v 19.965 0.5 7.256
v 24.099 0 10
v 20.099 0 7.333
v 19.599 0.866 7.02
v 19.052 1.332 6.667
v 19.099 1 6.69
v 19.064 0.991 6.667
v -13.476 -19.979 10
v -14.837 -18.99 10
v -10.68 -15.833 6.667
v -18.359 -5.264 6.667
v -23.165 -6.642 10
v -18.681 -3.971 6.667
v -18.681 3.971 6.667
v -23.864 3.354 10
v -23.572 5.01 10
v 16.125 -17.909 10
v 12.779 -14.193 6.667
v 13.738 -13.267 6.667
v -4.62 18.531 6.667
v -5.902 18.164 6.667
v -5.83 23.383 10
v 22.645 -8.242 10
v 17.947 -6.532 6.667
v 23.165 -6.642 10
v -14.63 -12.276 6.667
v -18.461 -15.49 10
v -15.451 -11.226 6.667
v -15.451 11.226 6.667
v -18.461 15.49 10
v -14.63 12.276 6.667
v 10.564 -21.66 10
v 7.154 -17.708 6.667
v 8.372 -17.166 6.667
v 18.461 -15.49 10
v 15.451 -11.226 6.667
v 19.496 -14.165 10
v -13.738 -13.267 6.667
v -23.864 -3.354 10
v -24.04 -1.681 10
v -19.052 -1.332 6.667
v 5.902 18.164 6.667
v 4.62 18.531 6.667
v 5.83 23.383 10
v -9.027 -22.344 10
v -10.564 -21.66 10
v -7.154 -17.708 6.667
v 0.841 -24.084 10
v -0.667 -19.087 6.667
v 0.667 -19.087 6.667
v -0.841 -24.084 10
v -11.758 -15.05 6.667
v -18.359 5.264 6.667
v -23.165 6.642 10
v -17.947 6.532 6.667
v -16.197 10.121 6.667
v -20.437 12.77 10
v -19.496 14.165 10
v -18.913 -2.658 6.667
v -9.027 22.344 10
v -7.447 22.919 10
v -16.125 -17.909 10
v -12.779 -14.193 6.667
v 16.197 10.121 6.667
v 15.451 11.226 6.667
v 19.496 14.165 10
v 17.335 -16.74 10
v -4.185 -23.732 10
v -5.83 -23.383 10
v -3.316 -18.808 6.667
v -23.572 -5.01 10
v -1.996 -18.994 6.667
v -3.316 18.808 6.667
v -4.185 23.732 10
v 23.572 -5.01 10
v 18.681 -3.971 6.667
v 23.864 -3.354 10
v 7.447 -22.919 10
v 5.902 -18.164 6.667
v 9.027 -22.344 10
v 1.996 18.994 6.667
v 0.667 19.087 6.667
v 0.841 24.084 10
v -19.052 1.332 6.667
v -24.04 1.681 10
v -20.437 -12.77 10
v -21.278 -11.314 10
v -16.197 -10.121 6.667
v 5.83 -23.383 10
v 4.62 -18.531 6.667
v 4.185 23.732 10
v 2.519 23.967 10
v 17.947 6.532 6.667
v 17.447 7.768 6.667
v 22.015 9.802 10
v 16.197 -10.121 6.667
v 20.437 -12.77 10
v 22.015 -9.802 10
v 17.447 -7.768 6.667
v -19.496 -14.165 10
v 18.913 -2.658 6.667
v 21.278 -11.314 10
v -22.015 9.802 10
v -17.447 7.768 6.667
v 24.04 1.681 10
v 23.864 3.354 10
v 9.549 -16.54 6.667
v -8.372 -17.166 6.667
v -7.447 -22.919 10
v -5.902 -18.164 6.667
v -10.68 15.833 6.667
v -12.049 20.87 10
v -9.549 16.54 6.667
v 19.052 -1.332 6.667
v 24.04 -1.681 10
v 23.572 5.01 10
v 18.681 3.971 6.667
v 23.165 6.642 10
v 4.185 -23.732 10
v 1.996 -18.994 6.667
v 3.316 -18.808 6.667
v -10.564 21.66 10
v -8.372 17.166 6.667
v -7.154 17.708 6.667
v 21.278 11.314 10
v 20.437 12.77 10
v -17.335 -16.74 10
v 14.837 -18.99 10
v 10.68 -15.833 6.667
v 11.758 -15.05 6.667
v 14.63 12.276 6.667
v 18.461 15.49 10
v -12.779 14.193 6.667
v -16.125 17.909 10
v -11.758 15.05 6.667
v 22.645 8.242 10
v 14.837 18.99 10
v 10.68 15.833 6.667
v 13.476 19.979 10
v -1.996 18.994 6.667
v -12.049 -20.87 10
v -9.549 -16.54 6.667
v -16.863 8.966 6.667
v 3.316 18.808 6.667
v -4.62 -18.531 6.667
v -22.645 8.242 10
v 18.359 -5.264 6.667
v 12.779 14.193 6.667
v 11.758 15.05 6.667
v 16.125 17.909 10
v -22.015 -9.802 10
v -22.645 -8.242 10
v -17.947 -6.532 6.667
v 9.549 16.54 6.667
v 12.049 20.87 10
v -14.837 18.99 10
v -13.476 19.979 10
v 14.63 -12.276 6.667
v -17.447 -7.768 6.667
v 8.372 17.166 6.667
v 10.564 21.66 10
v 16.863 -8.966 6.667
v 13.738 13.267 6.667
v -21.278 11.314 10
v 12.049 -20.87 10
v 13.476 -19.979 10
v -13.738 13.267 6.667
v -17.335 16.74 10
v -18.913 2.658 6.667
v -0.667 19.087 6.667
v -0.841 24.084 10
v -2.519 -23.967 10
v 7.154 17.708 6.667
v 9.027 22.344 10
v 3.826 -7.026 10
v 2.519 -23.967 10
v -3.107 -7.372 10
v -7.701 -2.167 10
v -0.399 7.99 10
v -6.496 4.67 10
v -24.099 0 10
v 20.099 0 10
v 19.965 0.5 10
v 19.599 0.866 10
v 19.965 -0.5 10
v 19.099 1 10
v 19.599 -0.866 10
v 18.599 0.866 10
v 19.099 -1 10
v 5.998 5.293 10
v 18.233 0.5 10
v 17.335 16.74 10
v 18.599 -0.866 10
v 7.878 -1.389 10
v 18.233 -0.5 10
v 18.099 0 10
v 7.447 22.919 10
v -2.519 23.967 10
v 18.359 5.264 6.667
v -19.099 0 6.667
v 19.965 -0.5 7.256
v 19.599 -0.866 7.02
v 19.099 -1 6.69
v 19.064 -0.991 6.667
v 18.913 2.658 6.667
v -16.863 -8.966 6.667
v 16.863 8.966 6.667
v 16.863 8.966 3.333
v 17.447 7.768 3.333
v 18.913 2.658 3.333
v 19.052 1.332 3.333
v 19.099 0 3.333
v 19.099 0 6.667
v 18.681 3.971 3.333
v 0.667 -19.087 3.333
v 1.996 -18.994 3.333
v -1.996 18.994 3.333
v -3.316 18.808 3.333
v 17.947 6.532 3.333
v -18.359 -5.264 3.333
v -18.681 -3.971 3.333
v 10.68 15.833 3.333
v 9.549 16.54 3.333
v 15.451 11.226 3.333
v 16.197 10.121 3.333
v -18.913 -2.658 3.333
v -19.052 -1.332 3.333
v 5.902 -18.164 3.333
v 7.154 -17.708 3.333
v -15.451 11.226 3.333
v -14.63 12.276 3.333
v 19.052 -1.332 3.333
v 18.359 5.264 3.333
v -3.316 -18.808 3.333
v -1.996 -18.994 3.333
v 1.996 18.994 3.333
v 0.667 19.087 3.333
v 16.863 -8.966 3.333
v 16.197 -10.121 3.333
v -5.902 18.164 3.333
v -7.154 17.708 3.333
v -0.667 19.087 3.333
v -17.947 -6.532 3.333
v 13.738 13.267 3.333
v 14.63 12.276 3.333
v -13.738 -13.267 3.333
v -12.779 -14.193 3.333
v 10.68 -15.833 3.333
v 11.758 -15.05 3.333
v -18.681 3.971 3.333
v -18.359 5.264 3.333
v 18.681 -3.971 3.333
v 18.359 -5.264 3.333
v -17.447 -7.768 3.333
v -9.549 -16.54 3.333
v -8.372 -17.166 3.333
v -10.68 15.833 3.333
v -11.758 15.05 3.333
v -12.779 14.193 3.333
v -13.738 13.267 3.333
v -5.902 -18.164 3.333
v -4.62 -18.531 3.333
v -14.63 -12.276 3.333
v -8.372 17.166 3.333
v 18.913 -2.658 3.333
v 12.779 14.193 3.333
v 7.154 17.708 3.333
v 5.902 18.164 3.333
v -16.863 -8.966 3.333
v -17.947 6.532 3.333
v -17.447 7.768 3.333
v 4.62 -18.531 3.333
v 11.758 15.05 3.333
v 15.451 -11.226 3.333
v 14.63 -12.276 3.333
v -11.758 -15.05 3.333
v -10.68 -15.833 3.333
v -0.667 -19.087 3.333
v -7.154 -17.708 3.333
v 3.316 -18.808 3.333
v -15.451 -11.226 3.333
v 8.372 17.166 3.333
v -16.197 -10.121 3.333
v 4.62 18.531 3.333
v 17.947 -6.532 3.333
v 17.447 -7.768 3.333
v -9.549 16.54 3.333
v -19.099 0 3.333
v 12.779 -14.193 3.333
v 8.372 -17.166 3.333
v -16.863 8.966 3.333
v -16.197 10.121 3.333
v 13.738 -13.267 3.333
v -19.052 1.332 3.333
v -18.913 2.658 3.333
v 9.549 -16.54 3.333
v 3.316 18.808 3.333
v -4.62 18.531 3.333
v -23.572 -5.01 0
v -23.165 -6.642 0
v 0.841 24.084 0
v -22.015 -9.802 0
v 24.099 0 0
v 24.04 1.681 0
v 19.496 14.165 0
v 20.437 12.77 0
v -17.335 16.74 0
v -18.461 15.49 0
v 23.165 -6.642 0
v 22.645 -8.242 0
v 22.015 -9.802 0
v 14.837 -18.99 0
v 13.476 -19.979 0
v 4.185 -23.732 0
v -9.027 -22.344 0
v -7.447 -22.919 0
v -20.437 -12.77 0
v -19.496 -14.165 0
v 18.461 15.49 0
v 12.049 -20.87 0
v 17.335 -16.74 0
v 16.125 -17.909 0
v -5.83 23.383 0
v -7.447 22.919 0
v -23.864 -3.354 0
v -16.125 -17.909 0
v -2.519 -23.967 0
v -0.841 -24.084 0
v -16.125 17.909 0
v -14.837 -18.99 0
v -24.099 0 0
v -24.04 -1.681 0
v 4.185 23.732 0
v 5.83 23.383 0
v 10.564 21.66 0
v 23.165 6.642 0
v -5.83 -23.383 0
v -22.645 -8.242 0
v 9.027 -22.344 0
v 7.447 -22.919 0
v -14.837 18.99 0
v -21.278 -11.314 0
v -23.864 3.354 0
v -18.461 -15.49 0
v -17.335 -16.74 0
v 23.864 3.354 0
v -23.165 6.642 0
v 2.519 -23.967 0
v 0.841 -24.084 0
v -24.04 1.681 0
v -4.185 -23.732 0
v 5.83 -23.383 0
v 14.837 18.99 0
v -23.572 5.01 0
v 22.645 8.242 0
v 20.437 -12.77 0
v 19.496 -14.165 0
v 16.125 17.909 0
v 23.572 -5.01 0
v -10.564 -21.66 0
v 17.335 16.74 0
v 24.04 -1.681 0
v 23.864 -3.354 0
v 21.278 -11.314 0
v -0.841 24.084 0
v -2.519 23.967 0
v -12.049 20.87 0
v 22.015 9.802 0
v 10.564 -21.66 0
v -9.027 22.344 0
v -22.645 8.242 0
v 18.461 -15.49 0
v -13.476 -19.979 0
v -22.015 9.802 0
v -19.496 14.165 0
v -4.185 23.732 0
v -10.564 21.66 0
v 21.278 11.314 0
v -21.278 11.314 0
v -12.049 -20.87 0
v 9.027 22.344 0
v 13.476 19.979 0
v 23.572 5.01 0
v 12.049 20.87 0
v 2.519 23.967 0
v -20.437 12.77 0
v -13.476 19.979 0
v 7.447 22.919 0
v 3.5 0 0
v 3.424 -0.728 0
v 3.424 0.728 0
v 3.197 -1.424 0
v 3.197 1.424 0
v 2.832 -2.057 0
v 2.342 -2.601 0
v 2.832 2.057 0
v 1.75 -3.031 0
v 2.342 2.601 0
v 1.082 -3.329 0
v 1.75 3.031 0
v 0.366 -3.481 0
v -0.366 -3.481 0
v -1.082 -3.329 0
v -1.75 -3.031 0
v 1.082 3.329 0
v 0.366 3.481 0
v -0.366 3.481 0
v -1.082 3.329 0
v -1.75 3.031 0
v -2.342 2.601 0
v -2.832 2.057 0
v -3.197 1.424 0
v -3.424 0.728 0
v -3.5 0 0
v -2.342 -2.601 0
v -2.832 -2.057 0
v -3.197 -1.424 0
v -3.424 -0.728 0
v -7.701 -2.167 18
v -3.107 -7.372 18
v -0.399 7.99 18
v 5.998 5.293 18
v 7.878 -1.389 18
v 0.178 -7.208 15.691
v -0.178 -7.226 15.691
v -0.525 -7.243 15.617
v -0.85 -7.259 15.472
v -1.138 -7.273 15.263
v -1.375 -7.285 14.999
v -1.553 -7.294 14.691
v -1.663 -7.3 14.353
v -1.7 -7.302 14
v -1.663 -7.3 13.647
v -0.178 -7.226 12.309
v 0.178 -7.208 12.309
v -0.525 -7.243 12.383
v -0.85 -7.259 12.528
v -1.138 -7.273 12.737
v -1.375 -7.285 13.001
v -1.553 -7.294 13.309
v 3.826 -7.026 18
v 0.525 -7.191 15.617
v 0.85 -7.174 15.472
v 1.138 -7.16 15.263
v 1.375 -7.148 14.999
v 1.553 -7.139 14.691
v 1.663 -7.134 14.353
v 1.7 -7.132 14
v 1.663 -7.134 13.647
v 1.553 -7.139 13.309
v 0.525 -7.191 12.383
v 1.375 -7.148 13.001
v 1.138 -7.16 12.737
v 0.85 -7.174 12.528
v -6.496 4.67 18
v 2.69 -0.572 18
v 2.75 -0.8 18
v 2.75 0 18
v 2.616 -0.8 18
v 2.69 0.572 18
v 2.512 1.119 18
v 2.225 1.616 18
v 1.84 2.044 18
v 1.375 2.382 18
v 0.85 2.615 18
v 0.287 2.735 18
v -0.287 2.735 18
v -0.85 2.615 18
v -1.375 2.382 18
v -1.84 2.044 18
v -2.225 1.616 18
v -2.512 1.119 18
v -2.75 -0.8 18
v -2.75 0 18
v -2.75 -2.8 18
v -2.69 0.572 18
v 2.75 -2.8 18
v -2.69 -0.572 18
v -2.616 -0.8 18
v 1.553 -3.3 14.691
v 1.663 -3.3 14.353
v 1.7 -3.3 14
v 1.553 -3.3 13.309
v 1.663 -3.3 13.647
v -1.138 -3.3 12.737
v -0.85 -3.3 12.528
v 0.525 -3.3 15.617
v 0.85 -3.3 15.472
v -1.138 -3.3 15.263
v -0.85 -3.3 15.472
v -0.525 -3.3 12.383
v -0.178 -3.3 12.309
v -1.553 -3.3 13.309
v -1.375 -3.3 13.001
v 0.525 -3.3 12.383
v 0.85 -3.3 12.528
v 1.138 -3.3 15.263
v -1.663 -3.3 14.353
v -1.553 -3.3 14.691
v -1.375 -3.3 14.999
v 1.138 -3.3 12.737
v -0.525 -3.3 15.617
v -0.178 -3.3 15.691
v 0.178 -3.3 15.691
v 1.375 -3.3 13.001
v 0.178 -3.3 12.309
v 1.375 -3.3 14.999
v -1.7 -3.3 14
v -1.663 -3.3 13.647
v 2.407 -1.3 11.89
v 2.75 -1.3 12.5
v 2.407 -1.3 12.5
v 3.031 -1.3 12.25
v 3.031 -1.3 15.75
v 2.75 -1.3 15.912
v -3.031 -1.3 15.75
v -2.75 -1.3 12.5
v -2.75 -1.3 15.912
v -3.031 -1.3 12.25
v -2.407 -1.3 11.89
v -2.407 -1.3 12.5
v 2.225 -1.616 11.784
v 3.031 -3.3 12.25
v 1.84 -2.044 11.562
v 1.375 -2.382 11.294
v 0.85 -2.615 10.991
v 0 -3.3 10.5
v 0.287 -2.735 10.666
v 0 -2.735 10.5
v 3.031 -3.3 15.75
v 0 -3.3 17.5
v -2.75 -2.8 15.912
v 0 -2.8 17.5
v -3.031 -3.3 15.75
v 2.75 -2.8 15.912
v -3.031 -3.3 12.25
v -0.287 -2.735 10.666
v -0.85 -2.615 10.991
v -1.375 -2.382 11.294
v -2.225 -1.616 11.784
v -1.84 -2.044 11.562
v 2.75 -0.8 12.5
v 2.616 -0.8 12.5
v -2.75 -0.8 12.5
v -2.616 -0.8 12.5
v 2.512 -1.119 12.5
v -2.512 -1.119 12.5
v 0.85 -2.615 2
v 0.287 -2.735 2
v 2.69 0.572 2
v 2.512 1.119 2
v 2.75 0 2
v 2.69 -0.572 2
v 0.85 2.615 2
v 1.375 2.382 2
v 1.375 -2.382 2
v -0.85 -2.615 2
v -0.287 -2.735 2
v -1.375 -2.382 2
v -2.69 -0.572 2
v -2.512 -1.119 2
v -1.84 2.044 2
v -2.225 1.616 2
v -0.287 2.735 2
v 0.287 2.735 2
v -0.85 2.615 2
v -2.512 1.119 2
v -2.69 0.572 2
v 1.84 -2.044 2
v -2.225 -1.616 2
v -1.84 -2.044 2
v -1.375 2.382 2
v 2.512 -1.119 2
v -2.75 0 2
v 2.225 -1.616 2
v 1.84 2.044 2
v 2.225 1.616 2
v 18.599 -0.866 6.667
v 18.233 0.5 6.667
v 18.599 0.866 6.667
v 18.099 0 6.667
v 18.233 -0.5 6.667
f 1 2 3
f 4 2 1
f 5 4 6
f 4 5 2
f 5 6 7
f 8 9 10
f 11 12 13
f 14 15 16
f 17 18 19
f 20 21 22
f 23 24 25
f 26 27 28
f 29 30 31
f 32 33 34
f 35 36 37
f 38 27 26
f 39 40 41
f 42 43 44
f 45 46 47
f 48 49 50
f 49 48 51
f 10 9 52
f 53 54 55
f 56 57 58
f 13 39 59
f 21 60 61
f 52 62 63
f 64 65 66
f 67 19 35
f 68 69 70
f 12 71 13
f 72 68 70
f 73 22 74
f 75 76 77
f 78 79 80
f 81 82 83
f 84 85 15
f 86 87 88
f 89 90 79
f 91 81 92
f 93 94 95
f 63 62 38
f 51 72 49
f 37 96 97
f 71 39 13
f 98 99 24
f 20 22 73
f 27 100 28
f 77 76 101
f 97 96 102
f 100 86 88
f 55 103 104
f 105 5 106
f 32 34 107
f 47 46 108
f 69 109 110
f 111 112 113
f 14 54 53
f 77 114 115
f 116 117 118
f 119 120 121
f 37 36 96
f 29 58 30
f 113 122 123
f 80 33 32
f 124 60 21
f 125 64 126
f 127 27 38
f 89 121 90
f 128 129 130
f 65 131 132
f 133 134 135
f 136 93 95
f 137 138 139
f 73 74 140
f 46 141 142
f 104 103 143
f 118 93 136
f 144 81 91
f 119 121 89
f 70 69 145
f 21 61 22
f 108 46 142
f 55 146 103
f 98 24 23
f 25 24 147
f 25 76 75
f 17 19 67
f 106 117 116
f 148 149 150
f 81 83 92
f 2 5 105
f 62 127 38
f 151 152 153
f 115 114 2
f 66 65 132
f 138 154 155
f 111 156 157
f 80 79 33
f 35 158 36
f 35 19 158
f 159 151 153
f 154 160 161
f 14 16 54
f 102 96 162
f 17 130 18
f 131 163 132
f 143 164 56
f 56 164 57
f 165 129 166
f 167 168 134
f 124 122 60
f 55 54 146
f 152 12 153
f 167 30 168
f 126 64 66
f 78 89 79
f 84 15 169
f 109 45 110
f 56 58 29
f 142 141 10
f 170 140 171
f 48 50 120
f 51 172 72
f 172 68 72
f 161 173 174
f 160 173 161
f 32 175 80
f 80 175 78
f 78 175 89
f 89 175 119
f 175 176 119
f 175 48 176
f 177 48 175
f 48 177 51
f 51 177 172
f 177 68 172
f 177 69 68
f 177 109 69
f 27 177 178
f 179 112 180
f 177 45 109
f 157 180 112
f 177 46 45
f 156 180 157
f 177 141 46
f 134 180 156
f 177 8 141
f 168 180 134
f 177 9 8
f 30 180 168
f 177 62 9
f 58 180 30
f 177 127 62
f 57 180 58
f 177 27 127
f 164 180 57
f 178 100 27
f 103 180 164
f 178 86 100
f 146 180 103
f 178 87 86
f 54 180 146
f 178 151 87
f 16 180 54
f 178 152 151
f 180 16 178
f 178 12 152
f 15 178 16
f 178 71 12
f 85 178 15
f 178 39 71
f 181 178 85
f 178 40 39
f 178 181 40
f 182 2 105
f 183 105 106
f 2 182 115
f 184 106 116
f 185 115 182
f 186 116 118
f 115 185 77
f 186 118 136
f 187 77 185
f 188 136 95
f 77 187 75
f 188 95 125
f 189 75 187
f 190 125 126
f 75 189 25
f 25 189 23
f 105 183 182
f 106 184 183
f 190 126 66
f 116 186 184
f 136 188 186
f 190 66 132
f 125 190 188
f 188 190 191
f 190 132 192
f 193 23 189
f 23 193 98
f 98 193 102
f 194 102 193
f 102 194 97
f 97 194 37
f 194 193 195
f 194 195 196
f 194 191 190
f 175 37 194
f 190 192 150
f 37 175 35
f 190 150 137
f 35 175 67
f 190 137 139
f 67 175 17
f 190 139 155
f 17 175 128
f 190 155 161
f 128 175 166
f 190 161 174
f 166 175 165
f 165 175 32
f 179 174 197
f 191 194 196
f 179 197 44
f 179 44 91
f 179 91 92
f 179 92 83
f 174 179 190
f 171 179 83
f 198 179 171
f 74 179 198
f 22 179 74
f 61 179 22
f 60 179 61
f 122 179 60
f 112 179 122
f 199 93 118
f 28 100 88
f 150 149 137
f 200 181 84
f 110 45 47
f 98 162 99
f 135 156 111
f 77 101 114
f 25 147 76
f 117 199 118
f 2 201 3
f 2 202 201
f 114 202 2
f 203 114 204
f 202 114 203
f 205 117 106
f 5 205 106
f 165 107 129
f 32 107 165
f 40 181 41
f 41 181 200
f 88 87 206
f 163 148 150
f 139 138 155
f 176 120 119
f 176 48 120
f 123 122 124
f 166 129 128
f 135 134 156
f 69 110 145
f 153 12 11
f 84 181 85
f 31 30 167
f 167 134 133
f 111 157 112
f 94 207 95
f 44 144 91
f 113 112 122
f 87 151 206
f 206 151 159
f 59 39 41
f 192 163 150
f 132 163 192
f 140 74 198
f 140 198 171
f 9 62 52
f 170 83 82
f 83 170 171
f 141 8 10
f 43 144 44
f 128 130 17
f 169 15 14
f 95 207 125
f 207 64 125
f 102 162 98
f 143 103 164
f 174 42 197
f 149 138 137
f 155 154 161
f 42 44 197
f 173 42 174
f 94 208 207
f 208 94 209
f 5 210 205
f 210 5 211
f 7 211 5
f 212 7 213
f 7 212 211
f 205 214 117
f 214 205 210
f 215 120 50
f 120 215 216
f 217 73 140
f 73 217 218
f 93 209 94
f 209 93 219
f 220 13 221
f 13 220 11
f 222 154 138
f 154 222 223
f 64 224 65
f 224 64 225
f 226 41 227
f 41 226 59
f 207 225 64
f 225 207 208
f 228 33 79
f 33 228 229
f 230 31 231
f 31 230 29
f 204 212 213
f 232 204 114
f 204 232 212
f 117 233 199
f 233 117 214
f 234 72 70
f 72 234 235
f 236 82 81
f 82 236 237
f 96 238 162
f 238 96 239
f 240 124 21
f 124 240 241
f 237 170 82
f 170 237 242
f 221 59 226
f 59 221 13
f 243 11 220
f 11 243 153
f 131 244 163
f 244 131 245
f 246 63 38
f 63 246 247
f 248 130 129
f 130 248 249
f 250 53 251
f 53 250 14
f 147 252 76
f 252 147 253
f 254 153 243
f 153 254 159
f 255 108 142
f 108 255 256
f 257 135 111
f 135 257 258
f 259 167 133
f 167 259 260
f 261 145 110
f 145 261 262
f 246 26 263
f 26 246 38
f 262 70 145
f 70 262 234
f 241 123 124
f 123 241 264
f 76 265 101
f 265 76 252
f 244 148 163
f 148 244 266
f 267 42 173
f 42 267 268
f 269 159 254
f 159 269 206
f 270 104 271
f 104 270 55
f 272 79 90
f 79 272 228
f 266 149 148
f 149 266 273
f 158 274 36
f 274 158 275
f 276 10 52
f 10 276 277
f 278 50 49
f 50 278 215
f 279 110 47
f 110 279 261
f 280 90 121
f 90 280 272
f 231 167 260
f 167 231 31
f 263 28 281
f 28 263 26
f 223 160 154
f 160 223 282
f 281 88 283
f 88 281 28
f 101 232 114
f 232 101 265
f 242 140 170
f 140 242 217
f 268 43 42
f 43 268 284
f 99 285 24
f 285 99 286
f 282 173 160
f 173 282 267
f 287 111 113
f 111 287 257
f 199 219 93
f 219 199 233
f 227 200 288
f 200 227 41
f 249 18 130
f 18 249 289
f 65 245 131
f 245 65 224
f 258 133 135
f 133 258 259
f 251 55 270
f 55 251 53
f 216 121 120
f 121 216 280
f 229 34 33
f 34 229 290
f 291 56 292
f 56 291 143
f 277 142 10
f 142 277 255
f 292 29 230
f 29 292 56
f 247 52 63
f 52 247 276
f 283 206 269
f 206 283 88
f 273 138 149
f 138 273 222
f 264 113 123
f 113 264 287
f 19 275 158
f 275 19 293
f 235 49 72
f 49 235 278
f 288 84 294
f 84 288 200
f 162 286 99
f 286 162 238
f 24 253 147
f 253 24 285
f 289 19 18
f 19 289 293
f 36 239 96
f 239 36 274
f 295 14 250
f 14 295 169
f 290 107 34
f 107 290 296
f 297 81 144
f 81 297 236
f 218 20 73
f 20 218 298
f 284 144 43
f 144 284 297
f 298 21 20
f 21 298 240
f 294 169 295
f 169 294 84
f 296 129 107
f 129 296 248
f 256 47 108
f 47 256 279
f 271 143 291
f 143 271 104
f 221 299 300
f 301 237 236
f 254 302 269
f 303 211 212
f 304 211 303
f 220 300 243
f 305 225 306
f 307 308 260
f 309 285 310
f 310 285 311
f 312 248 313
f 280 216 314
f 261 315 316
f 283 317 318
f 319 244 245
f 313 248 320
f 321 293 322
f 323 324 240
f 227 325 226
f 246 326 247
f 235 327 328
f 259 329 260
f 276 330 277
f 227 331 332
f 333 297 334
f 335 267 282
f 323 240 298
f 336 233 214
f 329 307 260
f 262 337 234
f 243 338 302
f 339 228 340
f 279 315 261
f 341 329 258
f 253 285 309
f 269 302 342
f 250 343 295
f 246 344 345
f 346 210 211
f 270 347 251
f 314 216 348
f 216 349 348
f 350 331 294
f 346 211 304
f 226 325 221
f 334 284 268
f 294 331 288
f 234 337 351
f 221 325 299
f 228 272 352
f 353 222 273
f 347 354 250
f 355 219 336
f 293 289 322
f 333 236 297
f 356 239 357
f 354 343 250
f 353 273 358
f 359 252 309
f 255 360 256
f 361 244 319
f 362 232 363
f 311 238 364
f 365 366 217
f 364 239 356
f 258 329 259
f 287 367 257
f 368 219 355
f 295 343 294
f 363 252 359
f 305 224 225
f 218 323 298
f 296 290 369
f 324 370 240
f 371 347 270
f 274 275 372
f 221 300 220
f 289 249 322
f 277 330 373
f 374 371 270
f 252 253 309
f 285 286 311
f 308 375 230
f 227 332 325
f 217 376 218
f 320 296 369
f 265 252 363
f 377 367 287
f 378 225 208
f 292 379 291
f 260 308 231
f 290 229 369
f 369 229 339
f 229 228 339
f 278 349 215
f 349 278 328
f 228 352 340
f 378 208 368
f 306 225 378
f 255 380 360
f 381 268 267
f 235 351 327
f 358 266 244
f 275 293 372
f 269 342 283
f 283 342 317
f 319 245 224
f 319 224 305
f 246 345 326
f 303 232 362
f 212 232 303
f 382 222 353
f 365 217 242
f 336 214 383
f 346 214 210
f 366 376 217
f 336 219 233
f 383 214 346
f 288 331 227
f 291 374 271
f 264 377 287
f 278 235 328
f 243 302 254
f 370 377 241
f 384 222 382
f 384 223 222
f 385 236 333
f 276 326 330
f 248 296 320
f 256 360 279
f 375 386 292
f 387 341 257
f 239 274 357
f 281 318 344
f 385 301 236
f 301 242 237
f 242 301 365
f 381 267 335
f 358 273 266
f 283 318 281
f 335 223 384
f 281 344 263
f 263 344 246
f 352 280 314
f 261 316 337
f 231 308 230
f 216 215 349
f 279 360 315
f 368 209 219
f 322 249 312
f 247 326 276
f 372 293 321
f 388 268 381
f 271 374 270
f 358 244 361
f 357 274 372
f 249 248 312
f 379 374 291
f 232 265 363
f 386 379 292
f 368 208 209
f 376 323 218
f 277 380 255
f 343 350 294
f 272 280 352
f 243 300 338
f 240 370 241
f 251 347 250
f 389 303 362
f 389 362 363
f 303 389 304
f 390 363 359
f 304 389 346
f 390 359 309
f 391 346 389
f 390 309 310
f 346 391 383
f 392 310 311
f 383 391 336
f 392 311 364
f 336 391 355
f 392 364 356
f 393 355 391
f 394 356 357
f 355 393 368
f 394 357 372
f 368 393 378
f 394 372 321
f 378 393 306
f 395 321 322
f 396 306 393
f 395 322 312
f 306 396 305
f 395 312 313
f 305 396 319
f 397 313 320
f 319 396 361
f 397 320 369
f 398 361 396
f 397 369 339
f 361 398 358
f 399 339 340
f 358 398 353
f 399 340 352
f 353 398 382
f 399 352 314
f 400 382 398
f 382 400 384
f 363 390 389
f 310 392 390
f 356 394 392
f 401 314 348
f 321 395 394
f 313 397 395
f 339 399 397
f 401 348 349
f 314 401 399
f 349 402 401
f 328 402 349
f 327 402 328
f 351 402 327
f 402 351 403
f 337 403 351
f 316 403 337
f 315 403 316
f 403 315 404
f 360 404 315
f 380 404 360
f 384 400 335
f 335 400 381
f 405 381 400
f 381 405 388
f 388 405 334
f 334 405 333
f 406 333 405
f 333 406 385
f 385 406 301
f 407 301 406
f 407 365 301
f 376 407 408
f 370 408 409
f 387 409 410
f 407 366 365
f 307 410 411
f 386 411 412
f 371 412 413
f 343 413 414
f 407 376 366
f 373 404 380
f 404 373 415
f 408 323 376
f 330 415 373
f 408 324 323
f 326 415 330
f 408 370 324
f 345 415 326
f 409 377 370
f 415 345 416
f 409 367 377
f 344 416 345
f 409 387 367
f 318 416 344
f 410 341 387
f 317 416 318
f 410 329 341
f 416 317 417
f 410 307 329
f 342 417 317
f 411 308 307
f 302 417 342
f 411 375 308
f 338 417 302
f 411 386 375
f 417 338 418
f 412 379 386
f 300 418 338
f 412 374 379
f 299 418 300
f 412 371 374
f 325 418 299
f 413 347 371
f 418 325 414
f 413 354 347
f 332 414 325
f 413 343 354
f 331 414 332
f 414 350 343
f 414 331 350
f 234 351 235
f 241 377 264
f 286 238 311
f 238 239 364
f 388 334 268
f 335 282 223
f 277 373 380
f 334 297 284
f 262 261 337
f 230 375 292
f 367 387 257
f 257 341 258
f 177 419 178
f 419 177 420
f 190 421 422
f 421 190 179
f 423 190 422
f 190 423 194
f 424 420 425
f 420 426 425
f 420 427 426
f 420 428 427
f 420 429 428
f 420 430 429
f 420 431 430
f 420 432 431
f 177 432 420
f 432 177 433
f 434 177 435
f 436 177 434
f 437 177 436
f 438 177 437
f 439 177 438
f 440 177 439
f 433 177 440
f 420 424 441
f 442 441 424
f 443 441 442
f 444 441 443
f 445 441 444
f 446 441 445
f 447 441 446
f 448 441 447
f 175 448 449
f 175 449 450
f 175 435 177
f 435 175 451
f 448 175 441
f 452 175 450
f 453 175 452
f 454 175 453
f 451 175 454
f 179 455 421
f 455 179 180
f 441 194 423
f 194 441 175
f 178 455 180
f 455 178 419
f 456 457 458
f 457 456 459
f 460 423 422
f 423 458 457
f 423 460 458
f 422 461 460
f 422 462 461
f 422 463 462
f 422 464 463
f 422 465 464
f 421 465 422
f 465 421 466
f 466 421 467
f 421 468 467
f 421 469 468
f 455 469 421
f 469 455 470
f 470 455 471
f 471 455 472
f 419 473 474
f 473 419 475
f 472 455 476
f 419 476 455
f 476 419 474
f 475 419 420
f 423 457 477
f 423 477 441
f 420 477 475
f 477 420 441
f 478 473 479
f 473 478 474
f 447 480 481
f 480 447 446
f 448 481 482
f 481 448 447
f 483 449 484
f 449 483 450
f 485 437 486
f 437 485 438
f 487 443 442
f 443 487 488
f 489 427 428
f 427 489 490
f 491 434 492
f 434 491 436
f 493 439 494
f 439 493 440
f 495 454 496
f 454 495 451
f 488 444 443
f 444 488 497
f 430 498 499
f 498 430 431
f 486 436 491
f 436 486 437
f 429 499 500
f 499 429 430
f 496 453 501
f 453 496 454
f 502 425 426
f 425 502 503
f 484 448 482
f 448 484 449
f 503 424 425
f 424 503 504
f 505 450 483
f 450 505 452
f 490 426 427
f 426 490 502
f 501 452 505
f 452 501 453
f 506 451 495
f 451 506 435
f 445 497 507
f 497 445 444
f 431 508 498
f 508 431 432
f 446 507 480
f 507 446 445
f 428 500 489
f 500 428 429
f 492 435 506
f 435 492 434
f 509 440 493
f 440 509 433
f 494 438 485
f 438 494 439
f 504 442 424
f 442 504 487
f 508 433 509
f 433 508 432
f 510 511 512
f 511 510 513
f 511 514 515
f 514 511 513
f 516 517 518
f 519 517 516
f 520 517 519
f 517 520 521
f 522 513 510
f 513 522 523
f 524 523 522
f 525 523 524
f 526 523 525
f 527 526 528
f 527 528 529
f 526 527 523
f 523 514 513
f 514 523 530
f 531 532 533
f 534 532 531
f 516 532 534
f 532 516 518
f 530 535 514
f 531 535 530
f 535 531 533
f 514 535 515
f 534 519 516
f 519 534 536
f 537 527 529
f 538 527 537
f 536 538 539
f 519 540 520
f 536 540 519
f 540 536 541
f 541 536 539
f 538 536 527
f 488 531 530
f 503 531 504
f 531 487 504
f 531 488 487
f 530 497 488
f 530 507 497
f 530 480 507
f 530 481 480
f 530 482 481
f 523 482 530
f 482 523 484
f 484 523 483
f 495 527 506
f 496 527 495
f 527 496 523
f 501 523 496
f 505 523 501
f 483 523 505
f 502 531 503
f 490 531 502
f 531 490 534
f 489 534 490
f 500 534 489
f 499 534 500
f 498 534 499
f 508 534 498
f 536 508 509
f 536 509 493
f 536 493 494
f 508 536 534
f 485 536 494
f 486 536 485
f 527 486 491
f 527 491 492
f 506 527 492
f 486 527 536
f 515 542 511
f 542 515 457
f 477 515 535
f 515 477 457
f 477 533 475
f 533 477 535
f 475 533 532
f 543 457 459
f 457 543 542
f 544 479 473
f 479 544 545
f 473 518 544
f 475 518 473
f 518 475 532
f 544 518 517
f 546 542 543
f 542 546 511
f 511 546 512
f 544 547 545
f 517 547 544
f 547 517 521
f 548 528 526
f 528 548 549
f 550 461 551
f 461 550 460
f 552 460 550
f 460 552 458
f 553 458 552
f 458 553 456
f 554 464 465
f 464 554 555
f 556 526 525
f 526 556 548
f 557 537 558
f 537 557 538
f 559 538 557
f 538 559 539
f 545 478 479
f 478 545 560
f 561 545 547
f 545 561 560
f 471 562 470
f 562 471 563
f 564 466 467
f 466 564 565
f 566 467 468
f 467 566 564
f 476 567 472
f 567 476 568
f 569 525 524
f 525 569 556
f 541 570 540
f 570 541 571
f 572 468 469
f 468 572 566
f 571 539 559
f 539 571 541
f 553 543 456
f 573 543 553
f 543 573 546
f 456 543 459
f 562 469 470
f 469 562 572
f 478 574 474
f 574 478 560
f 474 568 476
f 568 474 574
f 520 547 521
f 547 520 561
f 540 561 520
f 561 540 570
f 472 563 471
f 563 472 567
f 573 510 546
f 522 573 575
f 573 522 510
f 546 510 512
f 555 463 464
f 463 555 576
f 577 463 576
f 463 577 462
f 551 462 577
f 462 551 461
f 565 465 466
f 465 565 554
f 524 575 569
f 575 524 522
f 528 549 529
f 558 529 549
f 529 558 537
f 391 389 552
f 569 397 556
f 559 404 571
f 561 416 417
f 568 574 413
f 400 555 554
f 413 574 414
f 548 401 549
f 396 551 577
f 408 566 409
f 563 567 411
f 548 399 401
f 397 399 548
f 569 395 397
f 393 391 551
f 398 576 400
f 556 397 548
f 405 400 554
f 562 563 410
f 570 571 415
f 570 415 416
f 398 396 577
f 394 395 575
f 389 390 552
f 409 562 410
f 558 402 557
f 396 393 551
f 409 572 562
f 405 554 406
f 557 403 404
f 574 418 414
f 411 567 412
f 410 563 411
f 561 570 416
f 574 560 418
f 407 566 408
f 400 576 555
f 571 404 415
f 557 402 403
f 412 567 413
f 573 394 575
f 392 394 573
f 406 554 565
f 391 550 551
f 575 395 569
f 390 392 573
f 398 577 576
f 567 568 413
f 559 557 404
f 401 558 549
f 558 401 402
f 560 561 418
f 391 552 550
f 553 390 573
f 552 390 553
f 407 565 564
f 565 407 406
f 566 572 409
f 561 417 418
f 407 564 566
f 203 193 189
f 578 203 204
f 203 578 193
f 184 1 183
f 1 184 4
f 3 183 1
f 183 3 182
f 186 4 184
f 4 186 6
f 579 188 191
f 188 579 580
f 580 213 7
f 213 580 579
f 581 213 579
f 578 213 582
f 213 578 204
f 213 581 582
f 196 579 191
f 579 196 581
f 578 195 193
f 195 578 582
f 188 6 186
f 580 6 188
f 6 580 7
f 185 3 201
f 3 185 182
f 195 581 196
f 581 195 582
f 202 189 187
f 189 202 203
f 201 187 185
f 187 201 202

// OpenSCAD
/*
 * Pulley for the polargraph motors.
 * You will need two.
 */

circumference = 120;
height = 10;
shank_height = 8;
radius = circumference / (2 * PI);

render() difference()
{

union()
{
	// the two pieces of the pulley
	{
		translate([0,0,height*2/3])
		cylinder(r1=radius, r2=radius+height*0.5, h=height/3, $fn=90);

		translate([0,0,height/3])
		cylinder(r=radius, h=height/3, $fn=90);

		cylinder(r2=radius, r1=radius+height*0.5, h=height/3, $fn=90);
	}

	// the shank
	rotate([0,0,-10]) translate([0,0,height]) cylinder(r=8, h=shank_height, $fn=7);
}

// shaft for the 5mm nema23 stepper motor
cylinder(r=5.0/2 + 0.25, h=30, $fn=30);
cylinder(r1=5.0/2 + 1, r2=5.0/2 + 0.25, h=2, $fn=30);

translate([0,-5.0/2+1.2,height+shank_height/2])
rotate([90,0,0]) {
	// m3 mounting screw
	cylinder(r=3.0/2 + 0.2, h=30, $fn=30);
	// m3 nut to capture it
	rotate([0,0,30]) cylinder(r=6.0/2+0.5, h=2, $fn=6);
	translate([0,3.5,0.5]) cube([5.5,10,2],center=true);
}

// string hole
translate([radius,0,height*2/3]) cylinder(r=1, h=height+2, $fn=12);
}
